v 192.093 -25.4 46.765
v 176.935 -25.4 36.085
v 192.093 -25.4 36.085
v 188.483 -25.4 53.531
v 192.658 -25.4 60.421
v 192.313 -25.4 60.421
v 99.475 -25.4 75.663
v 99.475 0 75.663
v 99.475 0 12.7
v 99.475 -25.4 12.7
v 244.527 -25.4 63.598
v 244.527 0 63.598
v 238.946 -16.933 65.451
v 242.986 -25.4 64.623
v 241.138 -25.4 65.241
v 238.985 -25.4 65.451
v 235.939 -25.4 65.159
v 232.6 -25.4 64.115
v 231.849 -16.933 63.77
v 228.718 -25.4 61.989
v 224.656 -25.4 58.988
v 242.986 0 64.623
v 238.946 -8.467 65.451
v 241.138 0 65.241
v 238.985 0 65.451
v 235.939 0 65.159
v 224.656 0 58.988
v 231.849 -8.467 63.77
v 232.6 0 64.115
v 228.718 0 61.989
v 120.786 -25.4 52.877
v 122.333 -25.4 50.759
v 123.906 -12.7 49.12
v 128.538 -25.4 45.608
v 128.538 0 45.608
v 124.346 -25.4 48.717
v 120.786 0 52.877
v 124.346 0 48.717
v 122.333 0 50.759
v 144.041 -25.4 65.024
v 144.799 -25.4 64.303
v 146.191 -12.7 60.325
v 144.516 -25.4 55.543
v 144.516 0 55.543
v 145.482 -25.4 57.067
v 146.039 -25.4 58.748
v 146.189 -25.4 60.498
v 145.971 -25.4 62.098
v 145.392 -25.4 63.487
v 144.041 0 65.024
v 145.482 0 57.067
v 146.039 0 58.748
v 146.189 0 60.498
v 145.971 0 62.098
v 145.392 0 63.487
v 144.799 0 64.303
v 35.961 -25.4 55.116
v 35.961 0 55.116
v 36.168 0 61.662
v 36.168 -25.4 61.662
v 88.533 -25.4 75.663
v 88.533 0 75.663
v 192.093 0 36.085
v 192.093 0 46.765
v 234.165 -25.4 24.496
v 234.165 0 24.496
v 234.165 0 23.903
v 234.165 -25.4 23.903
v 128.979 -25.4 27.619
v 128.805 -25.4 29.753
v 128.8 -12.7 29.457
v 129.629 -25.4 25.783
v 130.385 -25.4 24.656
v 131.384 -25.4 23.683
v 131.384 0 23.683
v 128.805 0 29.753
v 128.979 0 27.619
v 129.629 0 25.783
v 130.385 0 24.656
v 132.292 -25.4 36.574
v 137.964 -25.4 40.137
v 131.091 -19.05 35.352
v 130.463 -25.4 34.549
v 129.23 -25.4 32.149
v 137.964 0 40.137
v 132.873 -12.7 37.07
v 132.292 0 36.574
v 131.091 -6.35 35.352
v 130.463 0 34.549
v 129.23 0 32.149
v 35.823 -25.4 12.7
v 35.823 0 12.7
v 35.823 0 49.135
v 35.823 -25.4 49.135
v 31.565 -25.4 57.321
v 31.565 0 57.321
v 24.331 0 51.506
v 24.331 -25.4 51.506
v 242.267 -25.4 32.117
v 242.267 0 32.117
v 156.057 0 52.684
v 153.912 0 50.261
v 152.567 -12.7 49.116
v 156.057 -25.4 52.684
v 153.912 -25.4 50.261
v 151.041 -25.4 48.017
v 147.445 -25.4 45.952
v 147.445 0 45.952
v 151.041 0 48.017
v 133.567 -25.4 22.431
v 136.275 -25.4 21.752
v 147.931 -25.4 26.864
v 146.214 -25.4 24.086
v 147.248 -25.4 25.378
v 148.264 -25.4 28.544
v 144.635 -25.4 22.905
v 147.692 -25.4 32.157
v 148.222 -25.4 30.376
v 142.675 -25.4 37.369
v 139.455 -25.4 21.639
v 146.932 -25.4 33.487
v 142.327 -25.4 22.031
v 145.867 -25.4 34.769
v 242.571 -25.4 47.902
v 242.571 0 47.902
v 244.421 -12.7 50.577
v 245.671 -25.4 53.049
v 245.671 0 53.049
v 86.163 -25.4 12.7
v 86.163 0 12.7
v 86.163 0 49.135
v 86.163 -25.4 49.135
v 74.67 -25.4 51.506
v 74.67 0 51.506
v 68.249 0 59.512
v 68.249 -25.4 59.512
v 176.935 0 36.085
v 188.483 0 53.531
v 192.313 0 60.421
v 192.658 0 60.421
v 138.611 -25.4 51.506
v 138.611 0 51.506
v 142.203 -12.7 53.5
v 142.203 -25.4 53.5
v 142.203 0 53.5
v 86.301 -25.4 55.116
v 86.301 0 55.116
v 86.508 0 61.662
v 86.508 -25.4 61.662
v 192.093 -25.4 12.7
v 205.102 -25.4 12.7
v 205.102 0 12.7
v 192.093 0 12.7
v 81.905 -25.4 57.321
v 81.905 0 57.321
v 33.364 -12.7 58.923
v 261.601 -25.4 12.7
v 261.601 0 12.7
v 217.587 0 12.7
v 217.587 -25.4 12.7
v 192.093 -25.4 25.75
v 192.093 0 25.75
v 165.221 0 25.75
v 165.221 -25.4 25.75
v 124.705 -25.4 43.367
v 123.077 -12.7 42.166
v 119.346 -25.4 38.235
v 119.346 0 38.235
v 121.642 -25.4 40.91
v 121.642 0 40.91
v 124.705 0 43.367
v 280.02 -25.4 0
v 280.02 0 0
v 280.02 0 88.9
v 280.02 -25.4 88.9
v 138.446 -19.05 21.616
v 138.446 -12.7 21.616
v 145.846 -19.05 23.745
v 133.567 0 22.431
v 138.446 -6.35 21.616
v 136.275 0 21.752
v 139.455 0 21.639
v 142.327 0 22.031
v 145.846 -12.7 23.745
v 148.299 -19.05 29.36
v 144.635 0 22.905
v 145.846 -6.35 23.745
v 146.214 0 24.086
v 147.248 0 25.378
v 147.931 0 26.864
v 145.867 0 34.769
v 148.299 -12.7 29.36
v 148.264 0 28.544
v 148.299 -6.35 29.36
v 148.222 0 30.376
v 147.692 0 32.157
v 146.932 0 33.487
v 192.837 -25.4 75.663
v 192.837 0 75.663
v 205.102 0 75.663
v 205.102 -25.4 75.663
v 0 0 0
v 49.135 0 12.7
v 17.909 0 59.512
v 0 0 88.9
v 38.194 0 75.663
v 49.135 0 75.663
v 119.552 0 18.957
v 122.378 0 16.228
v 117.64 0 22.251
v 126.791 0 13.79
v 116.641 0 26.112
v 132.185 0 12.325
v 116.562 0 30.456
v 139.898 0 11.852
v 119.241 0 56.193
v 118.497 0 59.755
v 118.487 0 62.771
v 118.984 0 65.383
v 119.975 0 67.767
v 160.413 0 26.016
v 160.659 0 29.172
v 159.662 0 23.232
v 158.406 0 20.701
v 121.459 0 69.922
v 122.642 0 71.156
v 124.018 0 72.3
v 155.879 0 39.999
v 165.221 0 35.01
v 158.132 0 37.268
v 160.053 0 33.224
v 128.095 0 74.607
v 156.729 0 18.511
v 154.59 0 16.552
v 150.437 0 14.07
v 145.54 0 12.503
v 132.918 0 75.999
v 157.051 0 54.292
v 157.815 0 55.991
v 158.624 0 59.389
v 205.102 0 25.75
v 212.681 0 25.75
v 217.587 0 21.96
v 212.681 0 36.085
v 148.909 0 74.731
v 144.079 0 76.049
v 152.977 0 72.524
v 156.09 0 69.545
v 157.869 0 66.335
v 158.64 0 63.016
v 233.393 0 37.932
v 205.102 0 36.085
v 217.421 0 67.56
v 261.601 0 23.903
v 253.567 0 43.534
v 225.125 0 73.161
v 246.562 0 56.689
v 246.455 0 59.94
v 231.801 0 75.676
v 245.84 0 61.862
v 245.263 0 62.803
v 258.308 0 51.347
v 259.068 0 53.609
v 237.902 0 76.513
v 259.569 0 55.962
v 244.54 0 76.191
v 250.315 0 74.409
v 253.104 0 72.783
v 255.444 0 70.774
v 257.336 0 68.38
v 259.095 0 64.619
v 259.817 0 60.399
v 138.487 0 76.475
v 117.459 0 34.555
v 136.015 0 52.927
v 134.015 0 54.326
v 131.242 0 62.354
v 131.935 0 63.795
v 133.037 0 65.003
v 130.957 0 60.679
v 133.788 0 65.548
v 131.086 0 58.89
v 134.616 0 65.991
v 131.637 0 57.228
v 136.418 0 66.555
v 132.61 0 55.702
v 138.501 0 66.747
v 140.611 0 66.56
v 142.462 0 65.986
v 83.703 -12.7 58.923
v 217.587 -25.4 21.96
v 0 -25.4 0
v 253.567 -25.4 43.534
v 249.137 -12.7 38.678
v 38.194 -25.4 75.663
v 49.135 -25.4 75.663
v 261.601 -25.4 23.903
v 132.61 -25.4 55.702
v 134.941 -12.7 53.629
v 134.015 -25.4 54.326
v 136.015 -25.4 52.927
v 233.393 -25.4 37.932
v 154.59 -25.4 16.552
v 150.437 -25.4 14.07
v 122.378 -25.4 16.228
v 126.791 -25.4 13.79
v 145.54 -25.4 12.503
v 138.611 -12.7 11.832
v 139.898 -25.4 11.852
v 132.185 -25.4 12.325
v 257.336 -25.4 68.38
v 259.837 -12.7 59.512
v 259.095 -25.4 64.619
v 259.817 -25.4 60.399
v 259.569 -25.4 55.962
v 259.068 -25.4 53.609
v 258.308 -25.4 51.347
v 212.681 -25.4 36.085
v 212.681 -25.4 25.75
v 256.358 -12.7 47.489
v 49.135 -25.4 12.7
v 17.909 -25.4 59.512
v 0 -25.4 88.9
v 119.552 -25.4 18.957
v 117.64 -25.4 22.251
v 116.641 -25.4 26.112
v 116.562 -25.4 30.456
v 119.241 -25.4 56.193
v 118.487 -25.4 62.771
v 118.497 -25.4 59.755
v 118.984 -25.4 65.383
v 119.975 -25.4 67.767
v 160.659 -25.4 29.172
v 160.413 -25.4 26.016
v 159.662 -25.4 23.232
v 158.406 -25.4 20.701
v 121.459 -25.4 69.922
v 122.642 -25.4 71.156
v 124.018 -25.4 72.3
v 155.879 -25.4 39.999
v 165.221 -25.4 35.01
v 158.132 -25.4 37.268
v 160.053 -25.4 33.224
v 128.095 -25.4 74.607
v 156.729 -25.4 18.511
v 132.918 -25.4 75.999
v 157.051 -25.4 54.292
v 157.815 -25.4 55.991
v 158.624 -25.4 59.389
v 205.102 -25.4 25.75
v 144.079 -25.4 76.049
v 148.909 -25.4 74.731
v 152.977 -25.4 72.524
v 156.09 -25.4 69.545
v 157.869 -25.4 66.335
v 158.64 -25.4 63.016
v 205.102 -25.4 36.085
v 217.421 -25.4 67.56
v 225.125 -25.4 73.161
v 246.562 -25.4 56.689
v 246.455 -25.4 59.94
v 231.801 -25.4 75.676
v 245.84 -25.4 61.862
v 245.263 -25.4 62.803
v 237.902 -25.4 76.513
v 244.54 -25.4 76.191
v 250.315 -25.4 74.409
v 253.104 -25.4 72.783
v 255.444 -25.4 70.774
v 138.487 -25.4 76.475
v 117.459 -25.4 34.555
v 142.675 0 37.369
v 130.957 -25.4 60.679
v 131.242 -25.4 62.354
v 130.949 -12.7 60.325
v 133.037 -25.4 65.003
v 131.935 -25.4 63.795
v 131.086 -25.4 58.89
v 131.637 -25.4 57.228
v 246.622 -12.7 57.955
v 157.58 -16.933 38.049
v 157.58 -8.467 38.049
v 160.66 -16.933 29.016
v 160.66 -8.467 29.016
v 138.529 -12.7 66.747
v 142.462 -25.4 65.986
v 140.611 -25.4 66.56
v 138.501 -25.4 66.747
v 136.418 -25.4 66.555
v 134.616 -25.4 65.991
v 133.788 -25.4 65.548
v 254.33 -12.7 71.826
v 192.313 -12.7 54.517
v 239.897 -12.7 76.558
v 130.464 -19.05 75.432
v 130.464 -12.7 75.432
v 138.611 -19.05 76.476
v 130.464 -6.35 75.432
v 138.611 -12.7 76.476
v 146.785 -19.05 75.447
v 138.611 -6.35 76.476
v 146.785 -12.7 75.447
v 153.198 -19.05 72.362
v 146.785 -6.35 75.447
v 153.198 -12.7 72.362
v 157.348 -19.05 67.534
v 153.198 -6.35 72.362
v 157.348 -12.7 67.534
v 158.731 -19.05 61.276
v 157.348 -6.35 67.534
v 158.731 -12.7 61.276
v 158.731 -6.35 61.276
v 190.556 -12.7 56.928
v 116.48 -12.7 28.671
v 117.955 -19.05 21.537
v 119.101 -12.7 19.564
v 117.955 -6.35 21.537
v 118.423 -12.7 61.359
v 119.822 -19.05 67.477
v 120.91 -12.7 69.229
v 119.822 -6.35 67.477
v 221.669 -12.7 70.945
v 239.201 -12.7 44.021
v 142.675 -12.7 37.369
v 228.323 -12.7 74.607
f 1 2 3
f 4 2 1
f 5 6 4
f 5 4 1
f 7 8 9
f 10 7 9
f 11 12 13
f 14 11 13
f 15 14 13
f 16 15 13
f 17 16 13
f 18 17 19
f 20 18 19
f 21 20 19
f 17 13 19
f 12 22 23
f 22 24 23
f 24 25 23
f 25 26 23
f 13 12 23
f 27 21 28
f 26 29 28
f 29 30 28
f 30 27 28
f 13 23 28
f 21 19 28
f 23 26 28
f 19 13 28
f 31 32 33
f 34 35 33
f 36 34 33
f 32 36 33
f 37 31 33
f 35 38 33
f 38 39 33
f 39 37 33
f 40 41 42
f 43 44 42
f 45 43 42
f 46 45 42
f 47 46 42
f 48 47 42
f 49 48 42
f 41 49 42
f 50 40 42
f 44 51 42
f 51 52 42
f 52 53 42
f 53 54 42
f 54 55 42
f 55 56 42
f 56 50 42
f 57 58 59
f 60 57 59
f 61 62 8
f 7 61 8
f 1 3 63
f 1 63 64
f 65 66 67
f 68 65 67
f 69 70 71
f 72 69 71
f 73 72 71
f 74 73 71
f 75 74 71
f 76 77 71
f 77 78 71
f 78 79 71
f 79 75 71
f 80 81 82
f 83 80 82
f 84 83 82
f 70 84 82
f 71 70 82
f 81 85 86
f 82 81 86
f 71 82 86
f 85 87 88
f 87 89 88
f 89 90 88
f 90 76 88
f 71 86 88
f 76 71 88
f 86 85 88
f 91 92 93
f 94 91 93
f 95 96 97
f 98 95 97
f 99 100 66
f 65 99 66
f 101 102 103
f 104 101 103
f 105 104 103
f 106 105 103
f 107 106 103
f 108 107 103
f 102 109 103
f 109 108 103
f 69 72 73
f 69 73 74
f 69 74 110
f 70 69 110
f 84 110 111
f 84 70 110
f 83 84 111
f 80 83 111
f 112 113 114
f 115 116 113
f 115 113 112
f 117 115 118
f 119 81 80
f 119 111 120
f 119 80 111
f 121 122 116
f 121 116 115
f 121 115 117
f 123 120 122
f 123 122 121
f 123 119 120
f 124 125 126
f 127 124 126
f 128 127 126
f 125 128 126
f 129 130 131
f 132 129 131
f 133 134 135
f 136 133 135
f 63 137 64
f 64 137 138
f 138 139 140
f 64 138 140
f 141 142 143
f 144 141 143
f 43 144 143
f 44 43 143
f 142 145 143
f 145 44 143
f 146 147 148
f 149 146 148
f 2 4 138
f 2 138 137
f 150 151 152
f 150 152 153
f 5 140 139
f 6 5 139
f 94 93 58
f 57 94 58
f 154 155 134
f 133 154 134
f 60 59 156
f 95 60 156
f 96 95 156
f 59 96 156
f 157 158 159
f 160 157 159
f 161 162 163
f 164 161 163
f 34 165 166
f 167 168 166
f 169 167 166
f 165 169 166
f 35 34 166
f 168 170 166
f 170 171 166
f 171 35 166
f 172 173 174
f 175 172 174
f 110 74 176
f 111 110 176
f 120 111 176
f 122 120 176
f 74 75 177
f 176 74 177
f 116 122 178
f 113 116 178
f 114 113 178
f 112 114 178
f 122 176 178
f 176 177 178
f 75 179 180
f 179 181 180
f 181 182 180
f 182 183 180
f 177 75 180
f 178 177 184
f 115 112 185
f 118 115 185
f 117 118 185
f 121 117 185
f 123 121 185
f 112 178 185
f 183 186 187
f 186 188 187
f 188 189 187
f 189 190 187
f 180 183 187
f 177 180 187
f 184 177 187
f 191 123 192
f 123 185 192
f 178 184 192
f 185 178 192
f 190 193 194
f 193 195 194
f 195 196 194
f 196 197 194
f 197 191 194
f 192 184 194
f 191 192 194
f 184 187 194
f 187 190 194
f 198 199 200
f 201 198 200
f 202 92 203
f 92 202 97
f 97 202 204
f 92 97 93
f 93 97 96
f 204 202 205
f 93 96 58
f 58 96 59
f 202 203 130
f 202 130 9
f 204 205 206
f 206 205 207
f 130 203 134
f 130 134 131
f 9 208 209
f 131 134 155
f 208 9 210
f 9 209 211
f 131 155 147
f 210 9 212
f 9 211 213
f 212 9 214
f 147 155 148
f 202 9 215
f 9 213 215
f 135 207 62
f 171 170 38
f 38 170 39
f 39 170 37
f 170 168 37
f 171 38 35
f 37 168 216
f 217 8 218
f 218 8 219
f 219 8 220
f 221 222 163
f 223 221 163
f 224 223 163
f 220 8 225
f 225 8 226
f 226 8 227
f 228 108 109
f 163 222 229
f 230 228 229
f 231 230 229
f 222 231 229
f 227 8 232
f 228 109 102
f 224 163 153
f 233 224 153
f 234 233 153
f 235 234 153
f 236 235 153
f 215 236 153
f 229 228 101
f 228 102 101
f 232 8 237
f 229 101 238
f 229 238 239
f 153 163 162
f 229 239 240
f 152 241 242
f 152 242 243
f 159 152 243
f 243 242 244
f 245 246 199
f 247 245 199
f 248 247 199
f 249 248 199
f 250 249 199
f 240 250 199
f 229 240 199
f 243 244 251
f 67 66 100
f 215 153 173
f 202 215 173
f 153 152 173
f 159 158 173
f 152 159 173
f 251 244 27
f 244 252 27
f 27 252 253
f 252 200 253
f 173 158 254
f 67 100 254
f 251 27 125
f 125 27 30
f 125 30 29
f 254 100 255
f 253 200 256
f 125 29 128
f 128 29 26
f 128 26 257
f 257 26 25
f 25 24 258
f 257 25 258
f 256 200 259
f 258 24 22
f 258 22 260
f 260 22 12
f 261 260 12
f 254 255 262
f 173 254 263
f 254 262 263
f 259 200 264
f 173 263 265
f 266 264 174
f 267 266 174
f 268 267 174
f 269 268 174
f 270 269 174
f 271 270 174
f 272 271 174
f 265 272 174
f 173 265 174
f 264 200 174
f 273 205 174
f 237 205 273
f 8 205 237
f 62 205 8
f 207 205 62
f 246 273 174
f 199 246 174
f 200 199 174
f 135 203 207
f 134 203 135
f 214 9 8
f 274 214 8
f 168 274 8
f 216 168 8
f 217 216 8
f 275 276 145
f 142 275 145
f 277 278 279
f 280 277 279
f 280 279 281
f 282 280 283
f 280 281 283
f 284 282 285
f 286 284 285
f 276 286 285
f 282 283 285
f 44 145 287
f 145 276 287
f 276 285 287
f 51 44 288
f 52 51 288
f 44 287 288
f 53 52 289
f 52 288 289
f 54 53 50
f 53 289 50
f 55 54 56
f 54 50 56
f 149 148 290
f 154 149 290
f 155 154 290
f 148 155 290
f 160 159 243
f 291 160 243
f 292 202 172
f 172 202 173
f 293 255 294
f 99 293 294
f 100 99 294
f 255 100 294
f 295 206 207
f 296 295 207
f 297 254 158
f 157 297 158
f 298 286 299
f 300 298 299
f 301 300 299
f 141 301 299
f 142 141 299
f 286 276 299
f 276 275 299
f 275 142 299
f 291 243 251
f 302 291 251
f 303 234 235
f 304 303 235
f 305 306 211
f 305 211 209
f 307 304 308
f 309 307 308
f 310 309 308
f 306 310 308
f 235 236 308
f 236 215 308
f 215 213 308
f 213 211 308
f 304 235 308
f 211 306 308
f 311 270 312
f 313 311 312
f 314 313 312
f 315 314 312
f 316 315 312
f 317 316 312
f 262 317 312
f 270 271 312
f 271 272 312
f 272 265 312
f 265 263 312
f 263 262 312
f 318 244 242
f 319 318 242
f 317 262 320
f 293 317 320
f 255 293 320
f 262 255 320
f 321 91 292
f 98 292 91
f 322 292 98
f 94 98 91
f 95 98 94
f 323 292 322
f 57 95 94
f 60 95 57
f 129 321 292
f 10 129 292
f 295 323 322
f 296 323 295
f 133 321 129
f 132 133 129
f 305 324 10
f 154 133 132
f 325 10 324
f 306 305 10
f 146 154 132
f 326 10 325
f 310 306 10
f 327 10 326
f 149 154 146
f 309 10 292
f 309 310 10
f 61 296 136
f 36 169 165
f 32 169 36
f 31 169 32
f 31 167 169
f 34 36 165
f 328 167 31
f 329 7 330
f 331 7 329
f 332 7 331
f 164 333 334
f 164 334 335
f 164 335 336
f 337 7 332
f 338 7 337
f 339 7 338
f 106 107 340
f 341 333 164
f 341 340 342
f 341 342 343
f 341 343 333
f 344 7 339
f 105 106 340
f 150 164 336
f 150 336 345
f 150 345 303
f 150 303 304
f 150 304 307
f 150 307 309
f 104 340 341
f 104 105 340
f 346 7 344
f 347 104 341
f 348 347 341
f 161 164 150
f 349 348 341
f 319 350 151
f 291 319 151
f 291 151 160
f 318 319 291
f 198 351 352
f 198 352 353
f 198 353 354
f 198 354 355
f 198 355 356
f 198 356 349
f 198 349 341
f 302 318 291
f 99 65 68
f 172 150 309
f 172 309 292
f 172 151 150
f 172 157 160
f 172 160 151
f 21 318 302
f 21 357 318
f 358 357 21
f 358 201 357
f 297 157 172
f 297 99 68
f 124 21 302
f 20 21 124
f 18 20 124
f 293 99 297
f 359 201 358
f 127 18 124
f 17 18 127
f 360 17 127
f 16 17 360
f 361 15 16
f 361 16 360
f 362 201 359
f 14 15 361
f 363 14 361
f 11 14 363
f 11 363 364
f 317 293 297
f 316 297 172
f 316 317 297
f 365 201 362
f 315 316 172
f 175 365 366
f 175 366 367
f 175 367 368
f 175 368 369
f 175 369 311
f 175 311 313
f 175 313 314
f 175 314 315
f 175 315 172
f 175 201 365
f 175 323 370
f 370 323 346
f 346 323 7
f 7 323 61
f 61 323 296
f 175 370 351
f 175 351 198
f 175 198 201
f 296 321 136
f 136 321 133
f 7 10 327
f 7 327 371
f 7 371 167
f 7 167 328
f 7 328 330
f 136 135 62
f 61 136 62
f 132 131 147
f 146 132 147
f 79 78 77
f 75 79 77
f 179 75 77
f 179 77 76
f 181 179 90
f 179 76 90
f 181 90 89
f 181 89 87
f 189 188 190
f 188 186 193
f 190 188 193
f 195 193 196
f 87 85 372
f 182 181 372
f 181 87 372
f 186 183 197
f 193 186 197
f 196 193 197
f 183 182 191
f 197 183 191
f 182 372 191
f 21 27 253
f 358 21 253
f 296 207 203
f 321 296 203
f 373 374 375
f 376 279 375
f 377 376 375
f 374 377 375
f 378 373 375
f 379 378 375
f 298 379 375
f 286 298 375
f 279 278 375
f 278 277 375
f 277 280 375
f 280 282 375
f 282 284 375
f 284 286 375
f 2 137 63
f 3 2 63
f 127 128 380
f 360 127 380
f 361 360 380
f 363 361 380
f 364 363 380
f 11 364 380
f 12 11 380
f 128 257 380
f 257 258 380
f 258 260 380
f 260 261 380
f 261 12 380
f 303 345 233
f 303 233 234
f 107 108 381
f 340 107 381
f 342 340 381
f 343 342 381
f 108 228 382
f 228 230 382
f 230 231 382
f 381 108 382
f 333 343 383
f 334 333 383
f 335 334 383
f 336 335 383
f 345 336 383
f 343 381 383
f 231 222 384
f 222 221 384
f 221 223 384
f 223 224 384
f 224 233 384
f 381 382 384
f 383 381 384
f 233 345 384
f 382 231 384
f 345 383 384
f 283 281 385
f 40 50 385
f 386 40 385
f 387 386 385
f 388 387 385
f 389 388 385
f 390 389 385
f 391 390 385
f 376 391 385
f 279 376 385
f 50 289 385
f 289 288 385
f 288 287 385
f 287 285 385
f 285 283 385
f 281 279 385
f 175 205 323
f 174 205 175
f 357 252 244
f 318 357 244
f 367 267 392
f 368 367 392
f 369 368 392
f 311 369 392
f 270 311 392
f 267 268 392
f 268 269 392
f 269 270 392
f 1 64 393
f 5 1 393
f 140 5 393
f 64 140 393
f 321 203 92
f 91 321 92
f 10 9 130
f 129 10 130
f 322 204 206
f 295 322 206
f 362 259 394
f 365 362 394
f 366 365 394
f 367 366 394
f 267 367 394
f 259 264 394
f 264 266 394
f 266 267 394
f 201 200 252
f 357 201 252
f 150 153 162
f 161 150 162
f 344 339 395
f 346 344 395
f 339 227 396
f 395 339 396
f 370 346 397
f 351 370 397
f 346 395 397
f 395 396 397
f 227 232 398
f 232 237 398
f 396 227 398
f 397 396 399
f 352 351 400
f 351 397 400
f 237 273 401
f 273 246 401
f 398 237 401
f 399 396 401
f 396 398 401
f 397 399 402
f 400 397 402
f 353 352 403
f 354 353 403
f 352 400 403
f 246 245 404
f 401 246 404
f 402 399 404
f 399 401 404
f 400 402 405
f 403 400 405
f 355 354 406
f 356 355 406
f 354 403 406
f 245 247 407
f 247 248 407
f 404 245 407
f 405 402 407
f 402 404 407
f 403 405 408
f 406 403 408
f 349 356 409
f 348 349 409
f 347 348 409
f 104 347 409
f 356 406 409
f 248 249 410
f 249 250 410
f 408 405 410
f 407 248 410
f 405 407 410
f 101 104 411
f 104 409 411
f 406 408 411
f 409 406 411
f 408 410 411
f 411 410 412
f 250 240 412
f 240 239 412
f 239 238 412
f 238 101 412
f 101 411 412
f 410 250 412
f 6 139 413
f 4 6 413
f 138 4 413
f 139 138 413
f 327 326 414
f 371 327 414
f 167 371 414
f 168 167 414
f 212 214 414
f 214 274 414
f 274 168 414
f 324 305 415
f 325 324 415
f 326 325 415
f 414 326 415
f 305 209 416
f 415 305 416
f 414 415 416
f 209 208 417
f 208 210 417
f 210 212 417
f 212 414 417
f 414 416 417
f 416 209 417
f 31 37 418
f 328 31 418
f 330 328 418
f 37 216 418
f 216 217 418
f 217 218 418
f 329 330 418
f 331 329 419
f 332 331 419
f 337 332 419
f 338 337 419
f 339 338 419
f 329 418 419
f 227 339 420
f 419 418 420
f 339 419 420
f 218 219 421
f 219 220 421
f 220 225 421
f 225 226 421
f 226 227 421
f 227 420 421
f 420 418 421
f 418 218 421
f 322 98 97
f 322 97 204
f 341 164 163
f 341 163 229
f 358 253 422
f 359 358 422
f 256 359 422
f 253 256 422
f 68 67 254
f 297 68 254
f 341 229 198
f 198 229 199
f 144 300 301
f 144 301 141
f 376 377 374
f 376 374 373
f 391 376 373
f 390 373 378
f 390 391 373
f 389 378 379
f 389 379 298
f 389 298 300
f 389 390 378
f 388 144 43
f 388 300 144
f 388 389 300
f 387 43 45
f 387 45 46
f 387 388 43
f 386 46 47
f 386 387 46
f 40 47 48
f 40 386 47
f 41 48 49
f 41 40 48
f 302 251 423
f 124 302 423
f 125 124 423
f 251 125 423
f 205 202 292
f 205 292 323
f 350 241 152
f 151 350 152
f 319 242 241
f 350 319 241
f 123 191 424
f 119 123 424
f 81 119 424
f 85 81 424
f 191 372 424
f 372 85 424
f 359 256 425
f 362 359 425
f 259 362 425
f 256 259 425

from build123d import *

# Parameters (mm, degrees)
F0_W     = 280.0201171875
F0_H     = 88.9
F1_DEPTH = 25.4


with BuildPart() as f1:
    # F0 (on Front) → F1 (new body)
    with BuildSketch(Plane.XZ):
        with Locations((140.0100585937, 44.45)):
            Rectangle(F0_W, F0_H)
        with BuildLine():
            Line((49.1353298611, 75.6625651042), (49.1353298611, 12.7))
            Line((49.1353298611, 12.7), (35.8234809028, 12.7))
            Line((35.8234809028, 12.7), (35.8234809028, 49.1353298611))
            Line((35.8234809028, 49.1353298611), (35.9612847222, 55.116015625))
            Line((35.9612847222, 55.116015625), (36.1679904514, 61.6616970486))
            add(Edge.make_bspline(
                [(36.1679904514, 61.6616970486), (32.8606987847, 58.3544053819), (31.5653428819, 57.3208767361)],
                knots=[0, 0, 0, 1, 1, 1], degree=2))
            Line((31.5653428819, 57.3208767361), (24.3306423611, 51.5055555556))
            Line((24.3306423611, 51.5055555556), (17.908984375, 59.5119574653))
            Line((17.908984375, 59.5119574653), (38.1937065972, 75.6625651042))
            Line((38.1937065972, 75.6625651042), (49.1353298611, 75.6625651042))
        make_face(mode=Mode.SUBTRACT)
        with BuildLine():
            Line((99.4750651042, 75.6625651042), (99.4750651042, 12.7))
            Line((99.4750651042, 12.7), (86.1632161458, 12.7))
            Line((86.1632161458, 12.7), (86.1632161458, 49.1353298611))
            Line((86.1632161458, 49.1353298611), (86.3010199653, 55.116015625))
            Line((86.3010199653, 55.116015625), (86.5077256944, 61.6616970486))
            add(Edge.make_bspline(
                [(86.5077256944, 61.6616970486), (83.2004340278, 58.3544053819), (81.905078125, 57.3208767361)],
                knots=[0, 0, 0, 1, 1, 1], degree=2))
            Line((81.905078125, 57.3208767361), (74.6703776042, 51.5055555556))
            Line((74.6703776042, 51.5055555556), (68.2487196181, 59.5119574653))
            Line((68.2487196181, 59.5119574653), (88.5334418403, 75.6625651042))
            Line((88.5334418403, 75.6625651042), (99.4750651042, 75.6625651042))
        make_face(mode=Mode.SUBTRACT)
        with BuildLine():
            add(Edge.make_bspline(
                [(124.0179253472, 72.3001519097), (129.6127604167, 76.4756076389), (138.6113498264, 76.4756076389)],
                knots=[0, 0, 0, 1, 1, 1], degree=2))
            add(Edge.make_bspline(
                [(138.6113498264, 76.4756076389), (147.6650607639, 76.4756076389), (153.1978841146, 72.3621636285)],
                knots=[0, 0, 0, 1, 1, 1], degree=2))
            add(Edge.make_bspline(
                [(153.1978841146, 72.3621636285), (158.7307074653, 68.2487196181), (158.7307074653, 61.2758463542)],
                knots=[0, 0, 0, 1, 1, 1], degree=2))
            add(Edge.make_bspline(
                [(158.7307074653, 61.2758463542), (158.7307074653, 56.4527126736), (156.0573133681, 52.6837782118)],
                knots=[0, 0, 0, 1, 1, 1], degree=2))
            add(Edge.make_bspline(
                [(156.0573133681, 52.6837782118), (153.3839192708, 48.91484375), (147.4445746528, 45.9520616319)],
                knots=[0, 0, 0, 1, 1, 1], degree=2))
            add(Edge.make_bspline(
                [(147.4445746528, 45.9520616319), (154.5001302083, 42.1624565972), (157.5800455729, 38.0490125868)],
                knots=[0, 0, 0, 1, 1, 1], degree=2))
            add(Edge.make_bspline(
                [(157.5800455729, 38.0490125868), (160.6599609375, 33.9355685764), (160.6599609375, 29.0159722222)],
                knots=[0, 0, 0, 1, 1, 1], degree=2))
            add(Edge.make_bspline(
                [(160.6599609375, 29.0159722222), (160.6599609375, 21.2713975694), (154.589702691, 16.5516167535)],
                knots=[0, 0, 0, 1, 1, 1], degree=2))
            add(Edge.make_bspline(
                [(154.589702691, 16.5516167535), (148.5194444444, 11.8318359375), (138.6113498264, 11.8318359375)],
                knots=[0, 0, 0, 1, 1, 1], degree=2))
            add(Edge.make_bspline(
                [(138.6113498264, 11.8318359375), (128.2760633681, 11.8318359375), (122.3780598958, 16.2277777778)],
                knots=[0, 0, 0, 1, 1, 1], degree=2))
            add(Edge.make_bspline(
                [(122.3780598958, 16.2277777778), (116.4800564236, 20.6237196181), (116.4800564236, 28.6714626736)],
                knots=[0, 0, 0, 1, 1, 1], degree=2))
            add(Edge.make_bspline(
                [(116.4800564236, 28.6714626736), (116.4800564236, 34.0595920139), (119.3463758681, 38.2350477431)],
                knots=[0, 0, 0, 1, 1, 1], degree=2))
            add(Edge.make_bspline(
                [(119.3463758681, 38.2350477431), (122.2126953125, 42.4105034722), (128.537890625, 45.6075520833)],
                knots=[0, 0, 0, 1, 1, 1], degree=2))
            add(Edge.make_bspline(
                [(128.537890625, 45.6075520833), (123.1497612847, 48.9975260417), (120.7864257812, 52.876703559)],
                knots=[0, 0, 0, 1, 1, 1], degree=2))
            add(Edge.make_bspline(
                [(120.7864257812, 52.876703559), (118.4230902778, 56.7558810764), (118.4230902778, 61.3585286458)],
                knots=[0, 0, 0, 1, 1, 1], degree=2))
            add(Edge.make_bspline(
                [(118.4230902778, 61.3585286458), (118.4230902778, 68.1246961806), (124.0179253472, 72.3001519097)],
                knots=[0, 0, 0, 1, 1, 1], degree=2))
        make_face(mode=Mode.SUBTRACT)
        Polygon((212.6809027778, 36.0853081597), (212.6809027778, 25.7500217014), (205.1016927083, 25.7500217014), (205.1016927083, 12.7), (192.0930121528, 12.7), (192.0930121528, 25.7500217014), (165.2212673611, 25.7500217014), (165.2212673611, 35.0104383681), (192.8371527778, 75.6625651042), (205.1016927083, 75.6625651042), (205.1016927083, 36.0853081597), align=None, mode=Mode.SUBTRACT)
        with BuildLine():
            Line((261.6012586806, 23.9034505208), (261.6012586806, 12.7))
            Line((261.6012586806, 12.7), (217.58671875, 12.7))
            Line((217.58671875, 12.7), (217.58671875, 21.9604166667))
            Line((217.58671875, 21.9604166667), (233.3928168403, 37.9318793403))
            add(Edge.make_bspline(
                [(233.3928168403, 37.9318793403), (240.4208116319, 45.1252387153), (242.5705512153, 47.9019856771)],
                knots=[0, 0, 0, 1, 1, 1], degree=2))
            add(Edge.make_bspline(
                [(242.5705512153, 47.9019856771), (244.7202907986, 50.6787326389), (245.6711371528, 53.0489583333)],
                knots=[0, 0, 0, 1, 1, 1], degree=2))
            add(Edge.make_bspline(
                [(245.6711371528, 53.0489583333), (246.6219835069, 55.4191840278), (246.6219835069, 57.9547743056)],
                knots=[0, 0, 0, 1, 1, 1], degree=2))
            add(Edge.make_bspline(
                [(246.6219835069, 57.9547743056), (246.6219835069, 61.7443793403), (244.5273654514, 63.5978407118)],
                knots=[0, 0, 0, 1, 1, 1], degree=2))
            add(Edge.make_bspline(
                [(244.5273654514, 63.5978407118), (242.4327473958, 65.4513020833), (238.9463107639, 65.4513020833)],
                knots=[0, 0, 0, 1, 1, 1], degree=2))
            add(Edge.make_bspline(
                [(238.9463107639, 65.4513020833), (235.2945095486, 65.4513020833), (231.8494140625, 63.7700954861)],
                knots=[0, 0, 0, 1, 1, 1], degree=2))
            add(Edge.make_bspline(
                [(231.8494140625, 63.7700954861), (228.4043185764, 62.0888888889), (224.6560546875, 58.9883029514)],
                knots=[0, 0, 0, 1, 1, 1], degree=2))
            Line((224.6560546875, 58.9883029514), (217.4213541667, 67.5597005208))
            add(Edge.make_bspline(
                [(217.4213541667, 67.5597005208), (222.0653428819, 71.5284505208), (225.1245876736, 73.1614257813)],
                knots=[0, 0, 0, 1, 1, 1], degree=2))
            add(Edge.make_bspline(
                [(225.1245876736, 73.1614257813), (228.1838324653, 74.7944010417), (231.8011827257, 75.6763454861)],
                knots=[0, 0, 0, 1, 1, 1], degree=2))
            add(Edge.make_bspline(
                [(231.8011827257, 75.6763454861), (235.4185329861, 76.5582899306), (239.8971571181, 76.5582899306)],
                knots=[0, 0, 0, 1, 1, 1], degree=2))
            add(Edge.make_bspline(
                [(239.8971571181, 76.5582899306), (245.7951605903, 76.5582899306), (250.3151258681, 74.4085503472)],
                knots=[0, 0, 0, 1, 1, 1], degree=2))
            add(Edge.make_bspline(
                [(250.3151258681, 74.4085503472), (254.8350911458, 72.2588107639), (257.3362304687, 68.3796332465)],
                knots=[0, 0, 0, 1, 1, 1], degree=2))
            add(Edge.make_bspline(
                [(257.3362304687, 68.3796332465), (259.8373697917, 64.5004557292), (259.8373697917, 59.5119574653)],
                knots=[0, 0, 0, 1, 1, 1], degree=2))
            add(Edge.make_bspline(
                [(259.8373697917, 59.5119574653), (259.8373697917, 55.1573567708), (258.3077473958, 51.3470811632)],
                knots=[0, 0, 0, 1, 1, 1], degree=2))
            add(Edge.make_bspline(
                [(258.3077473958, 51.3470811632), (256.778125, 47.5368055556), (253.5672960069, 43.5336046007)],
                knots=[0, 0, 0, 1, 1, 1], degree=2))
            add(Edge.make_bspline(
                [(253.5672960069, 43.5336046007), (250.3564670139, 39.5304036458), (242.2673828125, 32.1165581597)],
                knots=[0, 0, 0, 1, 1, 1], degree=2))
            Line((242.2673828125, 32.1165581597), (234.1645182292, 24.4960069444))
            Line((234.1645182292, 24.4960069444), (234.1645182292, 23.9034505208))
            Line((234.1645182292, 23.9034505208), (261.6012586806, 23.9034505208))
        make_face(mode=Mode.SUBTRACT)
    extrude(amount=F1_DEPTH)


with BuildPart() as f1b:
    # F0 (on Front) → F1, piece 2 (new body)
    with BuildSketch(Plane.XZ):
        with BuildLine():
            Line((176.9345920139, 36.0853081597), (192.0930121528, 36.0853081597))
            Line((192.0930121528, 36.0853081597), (192.0930121528, 46.7651041667))
            add(Edge.make_bspline(
                [(192.0930121528, 46.7651041667), (192.0930121528, 49.4384982639), (192.3134982639, 54.5165690104)],
                knots=[0, 0, 0, 1, 1, 1], degree=2))
            add(Edge.make_bspline(
                [(192.3134982639, 54.5165690104), (192.533984375, 59.5946397569), (192.6580078125, 60.4214626736)],
                knots=[0, 0, 0, 1, 1, 1], degree=2))
            Line((192.6580078125, 60.4214626736), (192.3134982639, 60.4214626736))
            add(Edge.make_bspline(
                [(192.3134982639, 60.4214626736), (190.7149739583, 56.8799045139), (188.4825520833, 53.5312717014)],
                knots=[0, 0, 0, 1, 1, 1], degree=2))
            Line((188.4825520833, 53.5312717014), (176.9345920139, 36.0853081597))
        make_face()
    extrude(amount=F1_DEPTH)


with BuildPart() as f1c:
    # F0 (on Front) → F1, piece 3 (new body)
    with BuildSketch(Plane.XZ):
        with BuildLine():
            add(Edge.make_bspline(
                [(137.963671875, 40.1367404514), (128.7997178819, 35.9061631944), (128.7997178819, 29.4569444444)],
                knots=[0, 0, 0, 1, 1, 1], degree=2))
            add(Edge.make_bspline(
                [(128.7997178819, 29.4569444444), (128.7997178819, 25.7500217014), (131.3835394965, 23.6829644097)],
                knots=[0, 0, 0, 1, 1, 1], degree=2))
            add(Edge.make_bspline(
                [(131.3835394965, 23.6829644097), (133.9673611111, 21.6159071181), (138.4459852431, 21.6159071181)],
                knots=[0, 0, 0, 1, 1, 1], degree=2))
            add(Edge.make_bspline(
                [(138.4459852431, 21.6159071181), (143.3931423611, 21.6159071181), (145.8460503472, 23.7449761285)],
                knots=[0, 0, 0, 1, 1, 1], degree=2))
            add(Edge.make_bspline(
                [(145.8460503472, 23.7449761285), (148.2989583333, 25.8740451389), (148.2989583333, 29.3604817708)],
                knots=[0, 0, 0, 1, 1, 1], degree=2))
            add(Edge.make_bspline(
                [(148.2989583333, 29.3604817708), (148.2989583333, 32.2543619792), (145.8667209201, 34.769281684)],
                knots=[0, 0, 0, 1, 1, 1], degree=2))
            add(Edge.make_bspline(
                [(145.8667209201, 34.769281684), (143.4344835069, 37.2842013889), (137.963671875, 40.1367404514)],
                knots=[0, 0, 0, 1, 1, 1], degree=2))
        make_face()
    extrude(amount=F1_DEPTH)


with BuildPart() as f1d:
    # F0 (on Front) → F1, piece 4 (new body)
    with BuildSketch(Plane.XZ):
        with BuildLine():
            add(Edge.make_bspline(
                [(144.0408203125, 65.0241102431), (141.8910807292, 66.7466579861), (138.5286675347, 66.7466579861)],
                knots=[0, 0, 0, 1, 1, 1], degree=2))
            add(Edge.make_bspline(
                [(138.5286675347, 66.7466579861), (135.1249131944, 66.7466579861), (133.0371853299, 65.0034396701)],
                knots=[0, 0, 0, 1, 1, 1], degree=2))
            add(Edge.make_bspline(
                [(133.0371853299, 65.0034396701), (130.9494574653, 63.2602213542), (130.9494574653, 60.325)],
                knots=[0, 0, 0, 1, 1, 1], degree=2))
            add(Edge.make_bspline(
                [(130.9494574653, 60.325), (130.9494574653, 57.7480685764), (132.6099934896, 55.7016818576)],
                knots=[0, 0, 0, 1, 1, 1], degree=2))
            add(Edge.make_bspline(
                [(132.6099934896, 55.7016818576), (134.2705295139, 53.6552951389), (138.6113498264, 51.5055555556)],
                knots=[0, 0, 0, 1, 1, 1], degree=2))
            add(Edge.make_bspline(
                [(138.6113498264, 51.5055555556), (142.8419270833, 53.4761501736), (144.5162434896, 55.5432074653)],
                knots=[0, 0, 0, 1, 1, 1], degree=2))
            add(Edge.make_bspline(
                [(144.5162434896, 55.5432074653), (146.1905598958, 57.6102647569), (146.1905598958, 60.325)],
                knots=[0, 0, 0, 1, 1, 1], degree=2))
            add(Edge.make_bspline(
                [(146.1905598958, 60.325), (146.1905598958, 63.3015625), (144.0408203125, 65.0241102431)],
                knots=[0, 0, 0, 1, 1, 1], degree=2))
        make_face()
    extrude(amount=F1_DEPTH)


solid = Compound([f1.part, f1b.part, f1c.part, f1d.part])
